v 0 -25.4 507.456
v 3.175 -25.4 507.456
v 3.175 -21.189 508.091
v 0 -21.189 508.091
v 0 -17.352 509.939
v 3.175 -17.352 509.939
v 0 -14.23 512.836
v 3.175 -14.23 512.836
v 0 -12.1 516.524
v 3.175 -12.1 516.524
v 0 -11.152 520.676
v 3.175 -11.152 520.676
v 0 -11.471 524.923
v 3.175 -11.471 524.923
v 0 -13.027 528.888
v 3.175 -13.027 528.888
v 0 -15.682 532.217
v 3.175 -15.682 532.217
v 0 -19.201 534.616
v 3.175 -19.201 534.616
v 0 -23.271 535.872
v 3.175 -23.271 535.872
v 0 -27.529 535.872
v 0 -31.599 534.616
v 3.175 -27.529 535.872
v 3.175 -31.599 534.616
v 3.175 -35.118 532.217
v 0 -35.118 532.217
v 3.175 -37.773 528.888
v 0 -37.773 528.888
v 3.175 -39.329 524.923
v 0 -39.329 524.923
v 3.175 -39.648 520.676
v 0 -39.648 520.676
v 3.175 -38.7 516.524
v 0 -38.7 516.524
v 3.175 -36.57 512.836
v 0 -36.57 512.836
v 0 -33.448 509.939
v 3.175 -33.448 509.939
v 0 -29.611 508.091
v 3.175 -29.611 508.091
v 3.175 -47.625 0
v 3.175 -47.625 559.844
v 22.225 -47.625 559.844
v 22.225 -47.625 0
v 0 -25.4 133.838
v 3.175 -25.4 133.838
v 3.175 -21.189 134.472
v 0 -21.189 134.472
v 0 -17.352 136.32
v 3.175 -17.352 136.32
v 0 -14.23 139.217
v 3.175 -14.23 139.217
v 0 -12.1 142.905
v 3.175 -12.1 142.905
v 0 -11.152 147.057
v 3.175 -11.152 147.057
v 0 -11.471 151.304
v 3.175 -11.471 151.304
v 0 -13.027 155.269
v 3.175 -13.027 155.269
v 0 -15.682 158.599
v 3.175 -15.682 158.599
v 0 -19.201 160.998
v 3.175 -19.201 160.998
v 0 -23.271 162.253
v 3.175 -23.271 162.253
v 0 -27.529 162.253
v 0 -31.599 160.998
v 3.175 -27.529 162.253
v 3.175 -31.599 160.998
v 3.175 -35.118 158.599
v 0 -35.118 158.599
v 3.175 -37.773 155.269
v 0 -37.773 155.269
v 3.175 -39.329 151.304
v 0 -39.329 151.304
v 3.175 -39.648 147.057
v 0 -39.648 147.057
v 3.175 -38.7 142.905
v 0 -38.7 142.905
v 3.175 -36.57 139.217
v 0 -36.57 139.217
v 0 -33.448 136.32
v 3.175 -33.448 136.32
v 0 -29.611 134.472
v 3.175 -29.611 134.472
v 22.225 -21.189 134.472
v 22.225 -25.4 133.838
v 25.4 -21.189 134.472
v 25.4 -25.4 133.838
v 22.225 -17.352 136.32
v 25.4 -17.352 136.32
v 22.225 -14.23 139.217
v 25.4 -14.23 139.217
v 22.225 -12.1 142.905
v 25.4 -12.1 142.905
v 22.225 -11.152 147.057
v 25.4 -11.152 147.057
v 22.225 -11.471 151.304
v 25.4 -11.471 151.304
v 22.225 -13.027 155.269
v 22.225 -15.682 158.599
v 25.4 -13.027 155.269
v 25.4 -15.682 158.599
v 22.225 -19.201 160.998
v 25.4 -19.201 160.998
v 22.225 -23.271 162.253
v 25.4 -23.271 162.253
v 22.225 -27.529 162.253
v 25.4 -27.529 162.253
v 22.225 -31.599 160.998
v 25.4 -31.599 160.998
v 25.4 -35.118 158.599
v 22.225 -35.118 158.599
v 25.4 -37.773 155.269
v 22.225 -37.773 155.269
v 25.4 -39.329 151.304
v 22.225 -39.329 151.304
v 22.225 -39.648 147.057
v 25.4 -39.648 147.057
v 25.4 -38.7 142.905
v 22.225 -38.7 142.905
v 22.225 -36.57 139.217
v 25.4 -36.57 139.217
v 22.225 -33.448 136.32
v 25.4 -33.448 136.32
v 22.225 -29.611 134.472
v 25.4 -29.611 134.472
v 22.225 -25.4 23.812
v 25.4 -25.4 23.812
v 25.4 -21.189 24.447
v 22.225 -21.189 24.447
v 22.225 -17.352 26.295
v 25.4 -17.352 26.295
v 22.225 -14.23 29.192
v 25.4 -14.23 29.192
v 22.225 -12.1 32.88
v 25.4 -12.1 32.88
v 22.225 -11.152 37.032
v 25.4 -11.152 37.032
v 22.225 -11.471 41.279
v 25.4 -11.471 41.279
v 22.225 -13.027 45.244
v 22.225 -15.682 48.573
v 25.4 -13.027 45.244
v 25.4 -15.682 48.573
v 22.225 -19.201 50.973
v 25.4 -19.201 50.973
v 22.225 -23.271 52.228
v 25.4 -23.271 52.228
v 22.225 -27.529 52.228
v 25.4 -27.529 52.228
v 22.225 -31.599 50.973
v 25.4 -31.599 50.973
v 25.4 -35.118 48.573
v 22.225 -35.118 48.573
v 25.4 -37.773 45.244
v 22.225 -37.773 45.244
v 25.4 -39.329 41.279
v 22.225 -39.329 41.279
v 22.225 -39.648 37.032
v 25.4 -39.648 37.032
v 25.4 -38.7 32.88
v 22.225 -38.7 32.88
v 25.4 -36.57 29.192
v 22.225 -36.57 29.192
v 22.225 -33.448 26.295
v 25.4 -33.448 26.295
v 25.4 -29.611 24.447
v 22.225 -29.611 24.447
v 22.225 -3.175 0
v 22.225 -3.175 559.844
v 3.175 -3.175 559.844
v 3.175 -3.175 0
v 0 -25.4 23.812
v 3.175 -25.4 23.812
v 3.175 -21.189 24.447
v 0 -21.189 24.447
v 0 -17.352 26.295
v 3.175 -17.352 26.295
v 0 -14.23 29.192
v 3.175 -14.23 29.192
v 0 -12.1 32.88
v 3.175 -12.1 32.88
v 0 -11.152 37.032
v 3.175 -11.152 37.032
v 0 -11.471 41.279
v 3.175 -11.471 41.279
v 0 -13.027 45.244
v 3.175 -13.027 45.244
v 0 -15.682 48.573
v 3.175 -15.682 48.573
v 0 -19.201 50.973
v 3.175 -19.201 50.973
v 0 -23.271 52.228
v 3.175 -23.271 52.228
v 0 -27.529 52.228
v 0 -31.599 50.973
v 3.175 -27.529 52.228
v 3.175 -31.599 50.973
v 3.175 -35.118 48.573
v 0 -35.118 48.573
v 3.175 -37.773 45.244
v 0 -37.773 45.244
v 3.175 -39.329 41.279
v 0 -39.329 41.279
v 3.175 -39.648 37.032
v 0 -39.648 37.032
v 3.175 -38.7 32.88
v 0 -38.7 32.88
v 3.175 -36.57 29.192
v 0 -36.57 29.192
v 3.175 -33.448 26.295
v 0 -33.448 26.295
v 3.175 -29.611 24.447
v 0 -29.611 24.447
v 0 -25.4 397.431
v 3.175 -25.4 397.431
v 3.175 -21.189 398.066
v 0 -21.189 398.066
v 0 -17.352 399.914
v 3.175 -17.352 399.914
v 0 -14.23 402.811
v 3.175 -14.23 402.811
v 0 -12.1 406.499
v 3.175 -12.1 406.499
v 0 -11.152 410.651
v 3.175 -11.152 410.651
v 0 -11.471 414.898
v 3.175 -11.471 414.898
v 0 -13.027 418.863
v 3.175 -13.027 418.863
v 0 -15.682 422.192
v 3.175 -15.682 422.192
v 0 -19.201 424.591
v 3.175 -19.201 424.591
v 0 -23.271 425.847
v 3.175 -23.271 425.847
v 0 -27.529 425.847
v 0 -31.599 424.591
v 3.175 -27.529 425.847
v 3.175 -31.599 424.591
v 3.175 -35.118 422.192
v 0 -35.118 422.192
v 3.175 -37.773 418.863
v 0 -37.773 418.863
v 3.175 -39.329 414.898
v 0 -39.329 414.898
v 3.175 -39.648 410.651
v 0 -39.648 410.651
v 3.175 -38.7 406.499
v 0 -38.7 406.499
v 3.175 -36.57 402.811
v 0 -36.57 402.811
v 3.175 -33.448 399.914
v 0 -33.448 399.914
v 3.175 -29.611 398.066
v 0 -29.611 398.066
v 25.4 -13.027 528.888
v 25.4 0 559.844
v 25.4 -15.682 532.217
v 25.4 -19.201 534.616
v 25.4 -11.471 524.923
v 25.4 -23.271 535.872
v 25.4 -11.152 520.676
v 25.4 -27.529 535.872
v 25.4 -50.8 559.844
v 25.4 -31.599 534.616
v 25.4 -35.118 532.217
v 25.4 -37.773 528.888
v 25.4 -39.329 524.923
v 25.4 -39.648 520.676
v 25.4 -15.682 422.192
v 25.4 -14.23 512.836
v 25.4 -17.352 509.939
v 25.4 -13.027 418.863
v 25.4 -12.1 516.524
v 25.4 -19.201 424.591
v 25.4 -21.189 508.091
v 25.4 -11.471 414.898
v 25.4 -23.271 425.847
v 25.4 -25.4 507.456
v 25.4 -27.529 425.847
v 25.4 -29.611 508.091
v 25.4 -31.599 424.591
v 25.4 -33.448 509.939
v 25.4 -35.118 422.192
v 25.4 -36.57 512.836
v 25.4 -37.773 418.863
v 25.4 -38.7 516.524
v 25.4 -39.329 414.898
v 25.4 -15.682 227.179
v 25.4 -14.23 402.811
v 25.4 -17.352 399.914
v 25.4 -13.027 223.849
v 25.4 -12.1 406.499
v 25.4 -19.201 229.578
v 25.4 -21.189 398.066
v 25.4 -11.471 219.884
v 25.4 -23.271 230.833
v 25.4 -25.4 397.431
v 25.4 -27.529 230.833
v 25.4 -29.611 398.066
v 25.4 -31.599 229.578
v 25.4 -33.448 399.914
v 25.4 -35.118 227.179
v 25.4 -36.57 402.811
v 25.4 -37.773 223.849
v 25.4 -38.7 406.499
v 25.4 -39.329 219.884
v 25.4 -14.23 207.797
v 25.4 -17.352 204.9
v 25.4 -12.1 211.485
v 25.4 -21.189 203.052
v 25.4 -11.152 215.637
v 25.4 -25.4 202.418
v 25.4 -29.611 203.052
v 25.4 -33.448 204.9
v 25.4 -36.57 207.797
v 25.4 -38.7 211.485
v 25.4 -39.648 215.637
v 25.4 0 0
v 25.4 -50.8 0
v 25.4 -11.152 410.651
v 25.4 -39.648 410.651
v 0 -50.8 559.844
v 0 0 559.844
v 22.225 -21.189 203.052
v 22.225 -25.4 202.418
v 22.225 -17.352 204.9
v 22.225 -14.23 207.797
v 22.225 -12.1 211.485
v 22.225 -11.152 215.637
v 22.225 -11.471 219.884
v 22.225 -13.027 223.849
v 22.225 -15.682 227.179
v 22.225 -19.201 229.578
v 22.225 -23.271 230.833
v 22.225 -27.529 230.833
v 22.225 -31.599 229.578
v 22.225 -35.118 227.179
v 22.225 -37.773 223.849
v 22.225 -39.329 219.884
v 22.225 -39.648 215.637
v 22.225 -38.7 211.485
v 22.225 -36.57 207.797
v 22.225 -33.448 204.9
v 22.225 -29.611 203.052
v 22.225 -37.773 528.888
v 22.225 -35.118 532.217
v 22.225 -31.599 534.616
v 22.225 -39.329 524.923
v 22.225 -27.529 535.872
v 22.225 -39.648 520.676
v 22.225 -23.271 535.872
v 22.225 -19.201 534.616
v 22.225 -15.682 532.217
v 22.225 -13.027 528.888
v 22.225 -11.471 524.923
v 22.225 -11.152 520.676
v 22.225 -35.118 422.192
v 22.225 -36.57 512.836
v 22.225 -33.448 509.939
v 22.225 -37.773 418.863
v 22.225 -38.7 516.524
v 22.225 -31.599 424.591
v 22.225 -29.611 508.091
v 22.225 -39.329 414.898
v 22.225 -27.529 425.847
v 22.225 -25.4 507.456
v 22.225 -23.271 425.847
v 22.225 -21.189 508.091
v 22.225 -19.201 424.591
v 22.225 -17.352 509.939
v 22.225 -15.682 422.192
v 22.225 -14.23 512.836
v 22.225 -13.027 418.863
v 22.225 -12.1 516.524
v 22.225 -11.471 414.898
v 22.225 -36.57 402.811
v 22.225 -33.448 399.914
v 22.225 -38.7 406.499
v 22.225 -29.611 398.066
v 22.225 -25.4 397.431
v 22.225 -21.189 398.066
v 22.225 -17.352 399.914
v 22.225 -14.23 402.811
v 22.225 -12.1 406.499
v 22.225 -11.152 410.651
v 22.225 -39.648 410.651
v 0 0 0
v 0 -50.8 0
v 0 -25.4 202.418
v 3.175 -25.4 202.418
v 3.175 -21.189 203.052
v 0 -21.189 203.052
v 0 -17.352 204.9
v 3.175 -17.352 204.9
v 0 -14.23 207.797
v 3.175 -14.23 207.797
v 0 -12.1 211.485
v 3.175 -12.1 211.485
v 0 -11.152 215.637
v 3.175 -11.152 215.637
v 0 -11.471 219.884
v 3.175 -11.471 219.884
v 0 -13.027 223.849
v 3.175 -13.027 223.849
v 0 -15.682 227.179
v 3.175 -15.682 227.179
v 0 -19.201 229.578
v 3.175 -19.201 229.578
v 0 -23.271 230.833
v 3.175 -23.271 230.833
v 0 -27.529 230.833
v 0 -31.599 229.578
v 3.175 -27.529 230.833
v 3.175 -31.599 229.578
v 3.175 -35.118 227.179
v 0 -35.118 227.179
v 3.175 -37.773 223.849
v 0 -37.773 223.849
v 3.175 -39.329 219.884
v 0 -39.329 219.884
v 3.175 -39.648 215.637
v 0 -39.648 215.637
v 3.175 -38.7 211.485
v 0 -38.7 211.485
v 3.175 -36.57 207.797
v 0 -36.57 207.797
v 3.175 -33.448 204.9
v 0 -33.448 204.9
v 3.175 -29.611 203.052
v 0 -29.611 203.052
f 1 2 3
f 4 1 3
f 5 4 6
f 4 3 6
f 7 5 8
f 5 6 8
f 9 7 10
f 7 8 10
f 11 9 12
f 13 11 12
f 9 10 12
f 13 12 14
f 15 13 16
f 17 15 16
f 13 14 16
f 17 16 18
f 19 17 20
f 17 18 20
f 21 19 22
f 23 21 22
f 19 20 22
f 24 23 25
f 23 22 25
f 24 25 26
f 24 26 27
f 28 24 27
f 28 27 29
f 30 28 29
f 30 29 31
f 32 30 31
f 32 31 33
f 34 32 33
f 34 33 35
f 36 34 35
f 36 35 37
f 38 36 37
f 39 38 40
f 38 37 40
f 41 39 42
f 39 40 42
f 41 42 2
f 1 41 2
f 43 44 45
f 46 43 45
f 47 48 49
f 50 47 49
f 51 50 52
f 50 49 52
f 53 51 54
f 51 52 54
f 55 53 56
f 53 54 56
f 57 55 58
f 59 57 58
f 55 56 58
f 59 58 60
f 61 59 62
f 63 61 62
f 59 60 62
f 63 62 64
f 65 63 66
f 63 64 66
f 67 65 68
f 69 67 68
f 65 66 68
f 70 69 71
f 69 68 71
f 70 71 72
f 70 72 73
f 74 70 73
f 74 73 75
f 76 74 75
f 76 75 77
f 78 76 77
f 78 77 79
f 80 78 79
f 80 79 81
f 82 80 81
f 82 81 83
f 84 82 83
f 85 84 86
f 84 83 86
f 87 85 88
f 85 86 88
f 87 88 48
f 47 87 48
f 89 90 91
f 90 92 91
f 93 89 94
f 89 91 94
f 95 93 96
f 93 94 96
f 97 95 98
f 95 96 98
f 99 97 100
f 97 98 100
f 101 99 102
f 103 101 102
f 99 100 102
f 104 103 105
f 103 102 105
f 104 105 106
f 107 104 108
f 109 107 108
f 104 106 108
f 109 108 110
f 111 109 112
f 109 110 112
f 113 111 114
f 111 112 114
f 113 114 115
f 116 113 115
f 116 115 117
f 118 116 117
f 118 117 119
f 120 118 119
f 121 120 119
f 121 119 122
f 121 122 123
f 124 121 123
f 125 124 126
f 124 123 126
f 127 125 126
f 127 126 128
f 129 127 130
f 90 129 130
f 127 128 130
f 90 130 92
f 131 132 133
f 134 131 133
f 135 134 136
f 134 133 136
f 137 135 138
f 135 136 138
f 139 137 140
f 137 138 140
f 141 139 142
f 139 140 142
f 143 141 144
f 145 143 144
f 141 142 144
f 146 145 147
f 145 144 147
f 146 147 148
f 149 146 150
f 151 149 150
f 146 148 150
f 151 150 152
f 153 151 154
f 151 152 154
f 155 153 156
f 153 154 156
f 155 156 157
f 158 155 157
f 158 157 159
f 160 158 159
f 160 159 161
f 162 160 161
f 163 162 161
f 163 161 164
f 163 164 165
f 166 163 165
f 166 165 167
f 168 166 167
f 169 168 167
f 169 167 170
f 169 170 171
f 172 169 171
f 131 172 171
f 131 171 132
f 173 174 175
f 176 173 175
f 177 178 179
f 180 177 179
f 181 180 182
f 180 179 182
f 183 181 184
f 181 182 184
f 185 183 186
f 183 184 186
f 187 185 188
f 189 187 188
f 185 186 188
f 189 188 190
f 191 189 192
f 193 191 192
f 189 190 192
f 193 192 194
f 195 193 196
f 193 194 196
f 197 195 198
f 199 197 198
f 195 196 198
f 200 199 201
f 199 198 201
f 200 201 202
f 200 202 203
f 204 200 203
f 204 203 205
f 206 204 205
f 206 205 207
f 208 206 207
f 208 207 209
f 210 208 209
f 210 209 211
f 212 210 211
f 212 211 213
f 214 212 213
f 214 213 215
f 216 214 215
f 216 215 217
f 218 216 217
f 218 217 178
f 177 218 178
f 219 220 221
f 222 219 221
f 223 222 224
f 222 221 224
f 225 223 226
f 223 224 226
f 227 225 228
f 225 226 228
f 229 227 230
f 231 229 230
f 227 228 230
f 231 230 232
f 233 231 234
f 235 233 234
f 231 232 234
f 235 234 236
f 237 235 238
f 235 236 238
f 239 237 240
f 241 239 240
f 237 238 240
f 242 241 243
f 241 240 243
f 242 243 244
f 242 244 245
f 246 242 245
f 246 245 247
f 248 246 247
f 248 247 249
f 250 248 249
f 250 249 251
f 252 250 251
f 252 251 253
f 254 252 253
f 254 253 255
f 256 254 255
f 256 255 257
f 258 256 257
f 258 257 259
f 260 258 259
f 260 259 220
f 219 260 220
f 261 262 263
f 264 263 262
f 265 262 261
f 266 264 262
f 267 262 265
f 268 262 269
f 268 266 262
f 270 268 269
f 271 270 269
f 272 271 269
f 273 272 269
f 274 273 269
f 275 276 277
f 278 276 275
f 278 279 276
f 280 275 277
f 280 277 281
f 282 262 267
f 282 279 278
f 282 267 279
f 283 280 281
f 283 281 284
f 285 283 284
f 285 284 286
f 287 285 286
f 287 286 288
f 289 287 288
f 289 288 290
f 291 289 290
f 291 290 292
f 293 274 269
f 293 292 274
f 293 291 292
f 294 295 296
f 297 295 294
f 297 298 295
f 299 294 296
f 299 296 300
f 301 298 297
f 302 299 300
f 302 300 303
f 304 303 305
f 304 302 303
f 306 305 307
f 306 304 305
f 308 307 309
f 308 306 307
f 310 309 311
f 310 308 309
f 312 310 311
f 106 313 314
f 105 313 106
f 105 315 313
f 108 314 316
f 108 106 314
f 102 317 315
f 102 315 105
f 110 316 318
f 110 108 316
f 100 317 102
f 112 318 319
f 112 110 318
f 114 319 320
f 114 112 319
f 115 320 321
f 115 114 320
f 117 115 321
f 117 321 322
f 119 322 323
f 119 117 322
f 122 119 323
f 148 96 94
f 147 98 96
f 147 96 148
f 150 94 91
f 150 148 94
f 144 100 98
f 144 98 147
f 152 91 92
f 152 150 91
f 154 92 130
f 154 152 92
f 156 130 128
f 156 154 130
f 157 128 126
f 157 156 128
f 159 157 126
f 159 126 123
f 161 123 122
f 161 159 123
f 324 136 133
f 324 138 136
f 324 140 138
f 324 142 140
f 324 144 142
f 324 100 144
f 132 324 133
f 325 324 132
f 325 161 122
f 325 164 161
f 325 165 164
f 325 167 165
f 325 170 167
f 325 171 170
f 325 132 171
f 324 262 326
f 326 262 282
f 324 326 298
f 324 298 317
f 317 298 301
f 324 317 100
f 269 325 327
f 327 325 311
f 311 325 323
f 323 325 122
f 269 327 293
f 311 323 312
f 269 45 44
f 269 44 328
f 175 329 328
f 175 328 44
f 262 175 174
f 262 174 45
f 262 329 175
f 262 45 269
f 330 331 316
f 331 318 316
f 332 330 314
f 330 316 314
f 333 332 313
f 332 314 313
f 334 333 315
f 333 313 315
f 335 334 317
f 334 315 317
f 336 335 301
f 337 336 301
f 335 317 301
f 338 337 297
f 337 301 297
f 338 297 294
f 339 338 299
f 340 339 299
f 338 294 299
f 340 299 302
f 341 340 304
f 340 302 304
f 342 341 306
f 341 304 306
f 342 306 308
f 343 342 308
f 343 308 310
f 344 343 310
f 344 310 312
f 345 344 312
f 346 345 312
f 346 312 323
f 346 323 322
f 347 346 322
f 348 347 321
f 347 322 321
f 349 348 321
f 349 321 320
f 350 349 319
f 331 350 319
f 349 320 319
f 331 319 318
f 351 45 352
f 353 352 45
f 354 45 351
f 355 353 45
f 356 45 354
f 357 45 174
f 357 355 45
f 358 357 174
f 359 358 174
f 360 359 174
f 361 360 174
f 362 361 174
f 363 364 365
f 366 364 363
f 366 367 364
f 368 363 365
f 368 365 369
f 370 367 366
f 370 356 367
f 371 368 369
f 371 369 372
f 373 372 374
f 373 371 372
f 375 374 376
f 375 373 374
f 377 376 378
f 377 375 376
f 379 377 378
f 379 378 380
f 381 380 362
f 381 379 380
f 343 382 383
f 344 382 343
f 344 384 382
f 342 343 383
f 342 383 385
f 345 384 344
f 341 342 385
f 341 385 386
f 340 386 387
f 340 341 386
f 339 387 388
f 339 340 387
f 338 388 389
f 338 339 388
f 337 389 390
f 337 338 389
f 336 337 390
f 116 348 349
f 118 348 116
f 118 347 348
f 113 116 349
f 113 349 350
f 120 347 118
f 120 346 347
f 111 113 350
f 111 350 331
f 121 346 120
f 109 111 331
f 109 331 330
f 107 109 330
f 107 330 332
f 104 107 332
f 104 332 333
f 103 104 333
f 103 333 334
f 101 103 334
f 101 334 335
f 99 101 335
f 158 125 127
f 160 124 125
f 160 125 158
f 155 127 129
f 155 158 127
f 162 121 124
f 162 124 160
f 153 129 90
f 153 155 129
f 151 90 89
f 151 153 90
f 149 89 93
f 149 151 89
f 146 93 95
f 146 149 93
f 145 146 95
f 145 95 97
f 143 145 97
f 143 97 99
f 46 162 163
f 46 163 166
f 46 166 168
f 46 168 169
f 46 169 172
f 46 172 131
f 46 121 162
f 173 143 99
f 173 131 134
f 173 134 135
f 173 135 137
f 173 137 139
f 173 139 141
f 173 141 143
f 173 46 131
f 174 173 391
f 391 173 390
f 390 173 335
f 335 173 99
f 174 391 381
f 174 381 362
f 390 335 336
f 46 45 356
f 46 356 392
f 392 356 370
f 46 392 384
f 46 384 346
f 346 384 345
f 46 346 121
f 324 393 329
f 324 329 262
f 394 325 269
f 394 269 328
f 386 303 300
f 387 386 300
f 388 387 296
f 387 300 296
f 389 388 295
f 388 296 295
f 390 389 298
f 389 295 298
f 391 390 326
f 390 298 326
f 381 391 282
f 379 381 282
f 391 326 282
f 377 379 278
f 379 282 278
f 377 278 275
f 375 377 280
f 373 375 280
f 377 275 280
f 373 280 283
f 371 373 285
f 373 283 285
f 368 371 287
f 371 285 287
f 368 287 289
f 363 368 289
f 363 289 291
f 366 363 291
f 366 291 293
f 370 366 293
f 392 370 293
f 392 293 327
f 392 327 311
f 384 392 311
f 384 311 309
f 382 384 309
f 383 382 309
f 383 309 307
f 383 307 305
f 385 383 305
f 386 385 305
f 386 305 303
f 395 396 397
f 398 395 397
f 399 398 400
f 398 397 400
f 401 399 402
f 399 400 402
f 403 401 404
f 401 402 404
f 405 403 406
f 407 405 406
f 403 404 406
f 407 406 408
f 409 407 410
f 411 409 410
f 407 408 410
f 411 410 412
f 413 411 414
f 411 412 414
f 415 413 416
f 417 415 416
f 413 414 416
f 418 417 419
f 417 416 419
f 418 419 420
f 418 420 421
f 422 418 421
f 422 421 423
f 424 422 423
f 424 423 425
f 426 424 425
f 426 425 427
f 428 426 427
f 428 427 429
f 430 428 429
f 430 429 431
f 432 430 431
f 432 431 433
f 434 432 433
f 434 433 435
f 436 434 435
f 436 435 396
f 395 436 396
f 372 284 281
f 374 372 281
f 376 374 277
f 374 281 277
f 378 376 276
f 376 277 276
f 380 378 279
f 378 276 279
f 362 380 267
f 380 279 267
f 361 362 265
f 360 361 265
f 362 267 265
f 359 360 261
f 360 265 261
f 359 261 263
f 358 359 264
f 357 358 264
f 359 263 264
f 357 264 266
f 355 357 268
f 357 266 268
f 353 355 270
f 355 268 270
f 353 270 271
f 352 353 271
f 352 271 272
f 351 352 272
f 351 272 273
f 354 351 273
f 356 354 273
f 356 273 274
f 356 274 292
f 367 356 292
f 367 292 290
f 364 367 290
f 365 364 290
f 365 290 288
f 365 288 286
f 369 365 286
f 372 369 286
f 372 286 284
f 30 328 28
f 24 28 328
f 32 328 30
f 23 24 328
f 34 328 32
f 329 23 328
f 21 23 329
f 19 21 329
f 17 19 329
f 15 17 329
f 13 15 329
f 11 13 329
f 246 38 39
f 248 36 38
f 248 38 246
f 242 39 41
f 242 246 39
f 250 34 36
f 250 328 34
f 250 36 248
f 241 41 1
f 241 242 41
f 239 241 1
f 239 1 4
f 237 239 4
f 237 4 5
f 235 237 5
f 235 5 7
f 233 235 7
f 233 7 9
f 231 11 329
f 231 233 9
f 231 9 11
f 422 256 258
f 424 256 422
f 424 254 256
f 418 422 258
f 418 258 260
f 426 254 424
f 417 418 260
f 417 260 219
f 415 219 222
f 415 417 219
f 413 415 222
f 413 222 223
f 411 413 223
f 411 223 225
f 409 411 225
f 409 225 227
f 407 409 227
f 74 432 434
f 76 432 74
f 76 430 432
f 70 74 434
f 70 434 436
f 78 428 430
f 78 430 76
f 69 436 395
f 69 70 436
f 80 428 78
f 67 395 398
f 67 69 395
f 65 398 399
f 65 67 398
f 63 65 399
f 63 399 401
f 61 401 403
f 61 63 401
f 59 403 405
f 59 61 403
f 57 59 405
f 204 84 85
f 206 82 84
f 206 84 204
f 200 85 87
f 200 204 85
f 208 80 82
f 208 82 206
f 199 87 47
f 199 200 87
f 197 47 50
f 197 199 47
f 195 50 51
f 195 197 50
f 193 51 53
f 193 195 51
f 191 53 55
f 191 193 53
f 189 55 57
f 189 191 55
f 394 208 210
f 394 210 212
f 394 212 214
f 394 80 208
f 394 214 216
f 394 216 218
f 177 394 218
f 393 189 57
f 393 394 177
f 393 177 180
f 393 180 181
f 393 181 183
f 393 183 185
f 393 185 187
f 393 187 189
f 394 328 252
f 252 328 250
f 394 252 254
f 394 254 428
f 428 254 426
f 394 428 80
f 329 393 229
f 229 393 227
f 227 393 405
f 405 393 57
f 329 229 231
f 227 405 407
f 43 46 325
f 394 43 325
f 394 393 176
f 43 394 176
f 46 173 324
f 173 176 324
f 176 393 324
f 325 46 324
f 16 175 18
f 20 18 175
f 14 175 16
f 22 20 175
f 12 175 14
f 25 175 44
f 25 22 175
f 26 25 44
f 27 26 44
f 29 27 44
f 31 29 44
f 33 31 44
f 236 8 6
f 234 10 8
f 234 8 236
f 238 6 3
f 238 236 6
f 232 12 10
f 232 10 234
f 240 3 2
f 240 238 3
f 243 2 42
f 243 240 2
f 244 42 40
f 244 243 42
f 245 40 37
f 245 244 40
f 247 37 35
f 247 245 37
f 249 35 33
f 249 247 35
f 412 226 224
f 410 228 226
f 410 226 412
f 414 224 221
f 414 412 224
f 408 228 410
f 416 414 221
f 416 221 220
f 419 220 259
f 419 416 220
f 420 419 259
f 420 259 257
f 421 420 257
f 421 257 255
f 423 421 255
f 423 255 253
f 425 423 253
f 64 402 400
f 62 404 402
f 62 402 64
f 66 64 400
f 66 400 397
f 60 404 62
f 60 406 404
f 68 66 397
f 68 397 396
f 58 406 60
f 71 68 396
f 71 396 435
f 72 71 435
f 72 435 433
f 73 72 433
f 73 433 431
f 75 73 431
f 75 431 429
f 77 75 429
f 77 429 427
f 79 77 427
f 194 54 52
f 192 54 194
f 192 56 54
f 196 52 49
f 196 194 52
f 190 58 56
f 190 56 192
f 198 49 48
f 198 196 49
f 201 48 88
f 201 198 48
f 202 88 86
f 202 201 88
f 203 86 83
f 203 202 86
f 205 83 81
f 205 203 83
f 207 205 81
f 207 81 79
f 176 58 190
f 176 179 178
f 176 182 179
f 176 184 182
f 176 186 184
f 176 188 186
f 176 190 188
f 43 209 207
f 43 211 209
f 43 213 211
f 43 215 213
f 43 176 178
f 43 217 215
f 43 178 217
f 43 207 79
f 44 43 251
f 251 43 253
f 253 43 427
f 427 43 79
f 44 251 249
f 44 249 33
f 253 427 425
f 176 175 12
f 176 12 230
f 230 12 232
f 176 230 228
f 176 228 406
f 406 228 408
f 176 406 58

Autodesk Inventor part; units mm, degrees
ref_plane "YZ Plane" through (0, 0, 0) normal (1, 0, 0) x (0, 1, 0)
ref_plane "XZ Plane" through (0, 0, 0) normal (0, 1, 0) x (-1, 0, 0)
ref_plane "XY Plane" through (0, 0, 0) normal (0, 0, 1) x (1, 0, 0)
sketch "Sketch1" plane through (0, 0, 0) normal (0, 0, 1) x (1, 0, 0)
  line L0 (0, 0) -> (25.4, 0)
  line L1 (25.4, 0) -> (25.4, -50.8)
  line L2 (25.4, -50.8) -> (0, -50.8)
  line L3 (0, -50.8) -> (0, 0)
  line L4 (22.225, -3.175) -> (3.175, -3.175)
  line L5 (3.175, -3.175) -> (3.175, -47.625)
  line L6 (3.175, -47.625) -> (22.225, -47.625)
  line L7 (22.225, -47.625) -> (22.225, -3.175)
  dimension "d0" = 25.4
  dimension "d1" = 50.8
  dimension "d2" = 3.175
extrude "Extrusion1" add sketch "Sketch1" along normal blind 559.8439
sketch "Sketch2" plane through (25.4, -50.8, 0) normal (1, 0, 0) x (0, 0, -1)
  circle A0 centre (-38.1, 25.4) radius 14.2875
  circle A1 centre (-148.1252, 25.4) radius 14.2875
  line L0 (0, 50.8) -> (0, 0) projected
  line L1 (-559.8439, 0) -> (-559.8439, 50.8) projected
  line L2 (0, 50.8) -> (-559.8439, 50.8) projected
  line L3 (0, 0) -> (-559.8439, 0) projected
  circle A2 centre (-216.7052, 25.4) radius 14.2875
  dimension "d7" = 25.4
  dimension "d8" = 25.4
  dimension "d9" = 28.575
  dimension "d10" = 28.575
  dimension "d14" = 110.0252
  dimension "d15" = 38.1
  dimension "d24" = 68.58
  dimension "d25" = 28.575
  dimension "d26" = 25.4
extrude "Extrusion2" cut sketch "Sketch2" against normal blind 254 contours A0 | A1
sketch "Sketch3" plane through (25.4, -50.8, 0) normal (1, 0, 0) x (0, 0, -1)
  circle A0 centre (-521.7439, 25.4) radius 14.2875
  circle A1 centre (-411.7188, 25.4) radius 14.2875
  line L0 (-559.8439, 0) -> (-559.8439, 50.8) projected
  line L1 (0, 50.8) -> (-559.8439, 50.8) projected
  dimension "d16" = 38.1
  dimension "d17" = 110.0252
  dimension "d18" = 25.4
  dimension "d19" = 25.4
  dimension "d20" = 28.575
  dimension "d21" = 28.575
extrude "Extrusion3" cut sketch "Sketch3" against normal blind 25.4
sketch "Sketch4" plane through (25.4, -50.8, 0) normal (1, 0, 0) x (0, 0, -1)
  circle A0 centre (-216.7052, 25.4) radius 14.2875
  circle A1 centre (-148.1252, 25.4) radius 14.2875 projected
  line L0 (0, 0) -> (-559.8439, 0) projected
  point P0 (0, 50.8)
  dimension "d27" = 68.58
  dimension "d28" = 28.575
  dimension "d29" = 25.4
extrude "Extrusion4" cut sketch "Sketch4" against normal blind 25.4 contours A0
properties part number "DRL Short"
